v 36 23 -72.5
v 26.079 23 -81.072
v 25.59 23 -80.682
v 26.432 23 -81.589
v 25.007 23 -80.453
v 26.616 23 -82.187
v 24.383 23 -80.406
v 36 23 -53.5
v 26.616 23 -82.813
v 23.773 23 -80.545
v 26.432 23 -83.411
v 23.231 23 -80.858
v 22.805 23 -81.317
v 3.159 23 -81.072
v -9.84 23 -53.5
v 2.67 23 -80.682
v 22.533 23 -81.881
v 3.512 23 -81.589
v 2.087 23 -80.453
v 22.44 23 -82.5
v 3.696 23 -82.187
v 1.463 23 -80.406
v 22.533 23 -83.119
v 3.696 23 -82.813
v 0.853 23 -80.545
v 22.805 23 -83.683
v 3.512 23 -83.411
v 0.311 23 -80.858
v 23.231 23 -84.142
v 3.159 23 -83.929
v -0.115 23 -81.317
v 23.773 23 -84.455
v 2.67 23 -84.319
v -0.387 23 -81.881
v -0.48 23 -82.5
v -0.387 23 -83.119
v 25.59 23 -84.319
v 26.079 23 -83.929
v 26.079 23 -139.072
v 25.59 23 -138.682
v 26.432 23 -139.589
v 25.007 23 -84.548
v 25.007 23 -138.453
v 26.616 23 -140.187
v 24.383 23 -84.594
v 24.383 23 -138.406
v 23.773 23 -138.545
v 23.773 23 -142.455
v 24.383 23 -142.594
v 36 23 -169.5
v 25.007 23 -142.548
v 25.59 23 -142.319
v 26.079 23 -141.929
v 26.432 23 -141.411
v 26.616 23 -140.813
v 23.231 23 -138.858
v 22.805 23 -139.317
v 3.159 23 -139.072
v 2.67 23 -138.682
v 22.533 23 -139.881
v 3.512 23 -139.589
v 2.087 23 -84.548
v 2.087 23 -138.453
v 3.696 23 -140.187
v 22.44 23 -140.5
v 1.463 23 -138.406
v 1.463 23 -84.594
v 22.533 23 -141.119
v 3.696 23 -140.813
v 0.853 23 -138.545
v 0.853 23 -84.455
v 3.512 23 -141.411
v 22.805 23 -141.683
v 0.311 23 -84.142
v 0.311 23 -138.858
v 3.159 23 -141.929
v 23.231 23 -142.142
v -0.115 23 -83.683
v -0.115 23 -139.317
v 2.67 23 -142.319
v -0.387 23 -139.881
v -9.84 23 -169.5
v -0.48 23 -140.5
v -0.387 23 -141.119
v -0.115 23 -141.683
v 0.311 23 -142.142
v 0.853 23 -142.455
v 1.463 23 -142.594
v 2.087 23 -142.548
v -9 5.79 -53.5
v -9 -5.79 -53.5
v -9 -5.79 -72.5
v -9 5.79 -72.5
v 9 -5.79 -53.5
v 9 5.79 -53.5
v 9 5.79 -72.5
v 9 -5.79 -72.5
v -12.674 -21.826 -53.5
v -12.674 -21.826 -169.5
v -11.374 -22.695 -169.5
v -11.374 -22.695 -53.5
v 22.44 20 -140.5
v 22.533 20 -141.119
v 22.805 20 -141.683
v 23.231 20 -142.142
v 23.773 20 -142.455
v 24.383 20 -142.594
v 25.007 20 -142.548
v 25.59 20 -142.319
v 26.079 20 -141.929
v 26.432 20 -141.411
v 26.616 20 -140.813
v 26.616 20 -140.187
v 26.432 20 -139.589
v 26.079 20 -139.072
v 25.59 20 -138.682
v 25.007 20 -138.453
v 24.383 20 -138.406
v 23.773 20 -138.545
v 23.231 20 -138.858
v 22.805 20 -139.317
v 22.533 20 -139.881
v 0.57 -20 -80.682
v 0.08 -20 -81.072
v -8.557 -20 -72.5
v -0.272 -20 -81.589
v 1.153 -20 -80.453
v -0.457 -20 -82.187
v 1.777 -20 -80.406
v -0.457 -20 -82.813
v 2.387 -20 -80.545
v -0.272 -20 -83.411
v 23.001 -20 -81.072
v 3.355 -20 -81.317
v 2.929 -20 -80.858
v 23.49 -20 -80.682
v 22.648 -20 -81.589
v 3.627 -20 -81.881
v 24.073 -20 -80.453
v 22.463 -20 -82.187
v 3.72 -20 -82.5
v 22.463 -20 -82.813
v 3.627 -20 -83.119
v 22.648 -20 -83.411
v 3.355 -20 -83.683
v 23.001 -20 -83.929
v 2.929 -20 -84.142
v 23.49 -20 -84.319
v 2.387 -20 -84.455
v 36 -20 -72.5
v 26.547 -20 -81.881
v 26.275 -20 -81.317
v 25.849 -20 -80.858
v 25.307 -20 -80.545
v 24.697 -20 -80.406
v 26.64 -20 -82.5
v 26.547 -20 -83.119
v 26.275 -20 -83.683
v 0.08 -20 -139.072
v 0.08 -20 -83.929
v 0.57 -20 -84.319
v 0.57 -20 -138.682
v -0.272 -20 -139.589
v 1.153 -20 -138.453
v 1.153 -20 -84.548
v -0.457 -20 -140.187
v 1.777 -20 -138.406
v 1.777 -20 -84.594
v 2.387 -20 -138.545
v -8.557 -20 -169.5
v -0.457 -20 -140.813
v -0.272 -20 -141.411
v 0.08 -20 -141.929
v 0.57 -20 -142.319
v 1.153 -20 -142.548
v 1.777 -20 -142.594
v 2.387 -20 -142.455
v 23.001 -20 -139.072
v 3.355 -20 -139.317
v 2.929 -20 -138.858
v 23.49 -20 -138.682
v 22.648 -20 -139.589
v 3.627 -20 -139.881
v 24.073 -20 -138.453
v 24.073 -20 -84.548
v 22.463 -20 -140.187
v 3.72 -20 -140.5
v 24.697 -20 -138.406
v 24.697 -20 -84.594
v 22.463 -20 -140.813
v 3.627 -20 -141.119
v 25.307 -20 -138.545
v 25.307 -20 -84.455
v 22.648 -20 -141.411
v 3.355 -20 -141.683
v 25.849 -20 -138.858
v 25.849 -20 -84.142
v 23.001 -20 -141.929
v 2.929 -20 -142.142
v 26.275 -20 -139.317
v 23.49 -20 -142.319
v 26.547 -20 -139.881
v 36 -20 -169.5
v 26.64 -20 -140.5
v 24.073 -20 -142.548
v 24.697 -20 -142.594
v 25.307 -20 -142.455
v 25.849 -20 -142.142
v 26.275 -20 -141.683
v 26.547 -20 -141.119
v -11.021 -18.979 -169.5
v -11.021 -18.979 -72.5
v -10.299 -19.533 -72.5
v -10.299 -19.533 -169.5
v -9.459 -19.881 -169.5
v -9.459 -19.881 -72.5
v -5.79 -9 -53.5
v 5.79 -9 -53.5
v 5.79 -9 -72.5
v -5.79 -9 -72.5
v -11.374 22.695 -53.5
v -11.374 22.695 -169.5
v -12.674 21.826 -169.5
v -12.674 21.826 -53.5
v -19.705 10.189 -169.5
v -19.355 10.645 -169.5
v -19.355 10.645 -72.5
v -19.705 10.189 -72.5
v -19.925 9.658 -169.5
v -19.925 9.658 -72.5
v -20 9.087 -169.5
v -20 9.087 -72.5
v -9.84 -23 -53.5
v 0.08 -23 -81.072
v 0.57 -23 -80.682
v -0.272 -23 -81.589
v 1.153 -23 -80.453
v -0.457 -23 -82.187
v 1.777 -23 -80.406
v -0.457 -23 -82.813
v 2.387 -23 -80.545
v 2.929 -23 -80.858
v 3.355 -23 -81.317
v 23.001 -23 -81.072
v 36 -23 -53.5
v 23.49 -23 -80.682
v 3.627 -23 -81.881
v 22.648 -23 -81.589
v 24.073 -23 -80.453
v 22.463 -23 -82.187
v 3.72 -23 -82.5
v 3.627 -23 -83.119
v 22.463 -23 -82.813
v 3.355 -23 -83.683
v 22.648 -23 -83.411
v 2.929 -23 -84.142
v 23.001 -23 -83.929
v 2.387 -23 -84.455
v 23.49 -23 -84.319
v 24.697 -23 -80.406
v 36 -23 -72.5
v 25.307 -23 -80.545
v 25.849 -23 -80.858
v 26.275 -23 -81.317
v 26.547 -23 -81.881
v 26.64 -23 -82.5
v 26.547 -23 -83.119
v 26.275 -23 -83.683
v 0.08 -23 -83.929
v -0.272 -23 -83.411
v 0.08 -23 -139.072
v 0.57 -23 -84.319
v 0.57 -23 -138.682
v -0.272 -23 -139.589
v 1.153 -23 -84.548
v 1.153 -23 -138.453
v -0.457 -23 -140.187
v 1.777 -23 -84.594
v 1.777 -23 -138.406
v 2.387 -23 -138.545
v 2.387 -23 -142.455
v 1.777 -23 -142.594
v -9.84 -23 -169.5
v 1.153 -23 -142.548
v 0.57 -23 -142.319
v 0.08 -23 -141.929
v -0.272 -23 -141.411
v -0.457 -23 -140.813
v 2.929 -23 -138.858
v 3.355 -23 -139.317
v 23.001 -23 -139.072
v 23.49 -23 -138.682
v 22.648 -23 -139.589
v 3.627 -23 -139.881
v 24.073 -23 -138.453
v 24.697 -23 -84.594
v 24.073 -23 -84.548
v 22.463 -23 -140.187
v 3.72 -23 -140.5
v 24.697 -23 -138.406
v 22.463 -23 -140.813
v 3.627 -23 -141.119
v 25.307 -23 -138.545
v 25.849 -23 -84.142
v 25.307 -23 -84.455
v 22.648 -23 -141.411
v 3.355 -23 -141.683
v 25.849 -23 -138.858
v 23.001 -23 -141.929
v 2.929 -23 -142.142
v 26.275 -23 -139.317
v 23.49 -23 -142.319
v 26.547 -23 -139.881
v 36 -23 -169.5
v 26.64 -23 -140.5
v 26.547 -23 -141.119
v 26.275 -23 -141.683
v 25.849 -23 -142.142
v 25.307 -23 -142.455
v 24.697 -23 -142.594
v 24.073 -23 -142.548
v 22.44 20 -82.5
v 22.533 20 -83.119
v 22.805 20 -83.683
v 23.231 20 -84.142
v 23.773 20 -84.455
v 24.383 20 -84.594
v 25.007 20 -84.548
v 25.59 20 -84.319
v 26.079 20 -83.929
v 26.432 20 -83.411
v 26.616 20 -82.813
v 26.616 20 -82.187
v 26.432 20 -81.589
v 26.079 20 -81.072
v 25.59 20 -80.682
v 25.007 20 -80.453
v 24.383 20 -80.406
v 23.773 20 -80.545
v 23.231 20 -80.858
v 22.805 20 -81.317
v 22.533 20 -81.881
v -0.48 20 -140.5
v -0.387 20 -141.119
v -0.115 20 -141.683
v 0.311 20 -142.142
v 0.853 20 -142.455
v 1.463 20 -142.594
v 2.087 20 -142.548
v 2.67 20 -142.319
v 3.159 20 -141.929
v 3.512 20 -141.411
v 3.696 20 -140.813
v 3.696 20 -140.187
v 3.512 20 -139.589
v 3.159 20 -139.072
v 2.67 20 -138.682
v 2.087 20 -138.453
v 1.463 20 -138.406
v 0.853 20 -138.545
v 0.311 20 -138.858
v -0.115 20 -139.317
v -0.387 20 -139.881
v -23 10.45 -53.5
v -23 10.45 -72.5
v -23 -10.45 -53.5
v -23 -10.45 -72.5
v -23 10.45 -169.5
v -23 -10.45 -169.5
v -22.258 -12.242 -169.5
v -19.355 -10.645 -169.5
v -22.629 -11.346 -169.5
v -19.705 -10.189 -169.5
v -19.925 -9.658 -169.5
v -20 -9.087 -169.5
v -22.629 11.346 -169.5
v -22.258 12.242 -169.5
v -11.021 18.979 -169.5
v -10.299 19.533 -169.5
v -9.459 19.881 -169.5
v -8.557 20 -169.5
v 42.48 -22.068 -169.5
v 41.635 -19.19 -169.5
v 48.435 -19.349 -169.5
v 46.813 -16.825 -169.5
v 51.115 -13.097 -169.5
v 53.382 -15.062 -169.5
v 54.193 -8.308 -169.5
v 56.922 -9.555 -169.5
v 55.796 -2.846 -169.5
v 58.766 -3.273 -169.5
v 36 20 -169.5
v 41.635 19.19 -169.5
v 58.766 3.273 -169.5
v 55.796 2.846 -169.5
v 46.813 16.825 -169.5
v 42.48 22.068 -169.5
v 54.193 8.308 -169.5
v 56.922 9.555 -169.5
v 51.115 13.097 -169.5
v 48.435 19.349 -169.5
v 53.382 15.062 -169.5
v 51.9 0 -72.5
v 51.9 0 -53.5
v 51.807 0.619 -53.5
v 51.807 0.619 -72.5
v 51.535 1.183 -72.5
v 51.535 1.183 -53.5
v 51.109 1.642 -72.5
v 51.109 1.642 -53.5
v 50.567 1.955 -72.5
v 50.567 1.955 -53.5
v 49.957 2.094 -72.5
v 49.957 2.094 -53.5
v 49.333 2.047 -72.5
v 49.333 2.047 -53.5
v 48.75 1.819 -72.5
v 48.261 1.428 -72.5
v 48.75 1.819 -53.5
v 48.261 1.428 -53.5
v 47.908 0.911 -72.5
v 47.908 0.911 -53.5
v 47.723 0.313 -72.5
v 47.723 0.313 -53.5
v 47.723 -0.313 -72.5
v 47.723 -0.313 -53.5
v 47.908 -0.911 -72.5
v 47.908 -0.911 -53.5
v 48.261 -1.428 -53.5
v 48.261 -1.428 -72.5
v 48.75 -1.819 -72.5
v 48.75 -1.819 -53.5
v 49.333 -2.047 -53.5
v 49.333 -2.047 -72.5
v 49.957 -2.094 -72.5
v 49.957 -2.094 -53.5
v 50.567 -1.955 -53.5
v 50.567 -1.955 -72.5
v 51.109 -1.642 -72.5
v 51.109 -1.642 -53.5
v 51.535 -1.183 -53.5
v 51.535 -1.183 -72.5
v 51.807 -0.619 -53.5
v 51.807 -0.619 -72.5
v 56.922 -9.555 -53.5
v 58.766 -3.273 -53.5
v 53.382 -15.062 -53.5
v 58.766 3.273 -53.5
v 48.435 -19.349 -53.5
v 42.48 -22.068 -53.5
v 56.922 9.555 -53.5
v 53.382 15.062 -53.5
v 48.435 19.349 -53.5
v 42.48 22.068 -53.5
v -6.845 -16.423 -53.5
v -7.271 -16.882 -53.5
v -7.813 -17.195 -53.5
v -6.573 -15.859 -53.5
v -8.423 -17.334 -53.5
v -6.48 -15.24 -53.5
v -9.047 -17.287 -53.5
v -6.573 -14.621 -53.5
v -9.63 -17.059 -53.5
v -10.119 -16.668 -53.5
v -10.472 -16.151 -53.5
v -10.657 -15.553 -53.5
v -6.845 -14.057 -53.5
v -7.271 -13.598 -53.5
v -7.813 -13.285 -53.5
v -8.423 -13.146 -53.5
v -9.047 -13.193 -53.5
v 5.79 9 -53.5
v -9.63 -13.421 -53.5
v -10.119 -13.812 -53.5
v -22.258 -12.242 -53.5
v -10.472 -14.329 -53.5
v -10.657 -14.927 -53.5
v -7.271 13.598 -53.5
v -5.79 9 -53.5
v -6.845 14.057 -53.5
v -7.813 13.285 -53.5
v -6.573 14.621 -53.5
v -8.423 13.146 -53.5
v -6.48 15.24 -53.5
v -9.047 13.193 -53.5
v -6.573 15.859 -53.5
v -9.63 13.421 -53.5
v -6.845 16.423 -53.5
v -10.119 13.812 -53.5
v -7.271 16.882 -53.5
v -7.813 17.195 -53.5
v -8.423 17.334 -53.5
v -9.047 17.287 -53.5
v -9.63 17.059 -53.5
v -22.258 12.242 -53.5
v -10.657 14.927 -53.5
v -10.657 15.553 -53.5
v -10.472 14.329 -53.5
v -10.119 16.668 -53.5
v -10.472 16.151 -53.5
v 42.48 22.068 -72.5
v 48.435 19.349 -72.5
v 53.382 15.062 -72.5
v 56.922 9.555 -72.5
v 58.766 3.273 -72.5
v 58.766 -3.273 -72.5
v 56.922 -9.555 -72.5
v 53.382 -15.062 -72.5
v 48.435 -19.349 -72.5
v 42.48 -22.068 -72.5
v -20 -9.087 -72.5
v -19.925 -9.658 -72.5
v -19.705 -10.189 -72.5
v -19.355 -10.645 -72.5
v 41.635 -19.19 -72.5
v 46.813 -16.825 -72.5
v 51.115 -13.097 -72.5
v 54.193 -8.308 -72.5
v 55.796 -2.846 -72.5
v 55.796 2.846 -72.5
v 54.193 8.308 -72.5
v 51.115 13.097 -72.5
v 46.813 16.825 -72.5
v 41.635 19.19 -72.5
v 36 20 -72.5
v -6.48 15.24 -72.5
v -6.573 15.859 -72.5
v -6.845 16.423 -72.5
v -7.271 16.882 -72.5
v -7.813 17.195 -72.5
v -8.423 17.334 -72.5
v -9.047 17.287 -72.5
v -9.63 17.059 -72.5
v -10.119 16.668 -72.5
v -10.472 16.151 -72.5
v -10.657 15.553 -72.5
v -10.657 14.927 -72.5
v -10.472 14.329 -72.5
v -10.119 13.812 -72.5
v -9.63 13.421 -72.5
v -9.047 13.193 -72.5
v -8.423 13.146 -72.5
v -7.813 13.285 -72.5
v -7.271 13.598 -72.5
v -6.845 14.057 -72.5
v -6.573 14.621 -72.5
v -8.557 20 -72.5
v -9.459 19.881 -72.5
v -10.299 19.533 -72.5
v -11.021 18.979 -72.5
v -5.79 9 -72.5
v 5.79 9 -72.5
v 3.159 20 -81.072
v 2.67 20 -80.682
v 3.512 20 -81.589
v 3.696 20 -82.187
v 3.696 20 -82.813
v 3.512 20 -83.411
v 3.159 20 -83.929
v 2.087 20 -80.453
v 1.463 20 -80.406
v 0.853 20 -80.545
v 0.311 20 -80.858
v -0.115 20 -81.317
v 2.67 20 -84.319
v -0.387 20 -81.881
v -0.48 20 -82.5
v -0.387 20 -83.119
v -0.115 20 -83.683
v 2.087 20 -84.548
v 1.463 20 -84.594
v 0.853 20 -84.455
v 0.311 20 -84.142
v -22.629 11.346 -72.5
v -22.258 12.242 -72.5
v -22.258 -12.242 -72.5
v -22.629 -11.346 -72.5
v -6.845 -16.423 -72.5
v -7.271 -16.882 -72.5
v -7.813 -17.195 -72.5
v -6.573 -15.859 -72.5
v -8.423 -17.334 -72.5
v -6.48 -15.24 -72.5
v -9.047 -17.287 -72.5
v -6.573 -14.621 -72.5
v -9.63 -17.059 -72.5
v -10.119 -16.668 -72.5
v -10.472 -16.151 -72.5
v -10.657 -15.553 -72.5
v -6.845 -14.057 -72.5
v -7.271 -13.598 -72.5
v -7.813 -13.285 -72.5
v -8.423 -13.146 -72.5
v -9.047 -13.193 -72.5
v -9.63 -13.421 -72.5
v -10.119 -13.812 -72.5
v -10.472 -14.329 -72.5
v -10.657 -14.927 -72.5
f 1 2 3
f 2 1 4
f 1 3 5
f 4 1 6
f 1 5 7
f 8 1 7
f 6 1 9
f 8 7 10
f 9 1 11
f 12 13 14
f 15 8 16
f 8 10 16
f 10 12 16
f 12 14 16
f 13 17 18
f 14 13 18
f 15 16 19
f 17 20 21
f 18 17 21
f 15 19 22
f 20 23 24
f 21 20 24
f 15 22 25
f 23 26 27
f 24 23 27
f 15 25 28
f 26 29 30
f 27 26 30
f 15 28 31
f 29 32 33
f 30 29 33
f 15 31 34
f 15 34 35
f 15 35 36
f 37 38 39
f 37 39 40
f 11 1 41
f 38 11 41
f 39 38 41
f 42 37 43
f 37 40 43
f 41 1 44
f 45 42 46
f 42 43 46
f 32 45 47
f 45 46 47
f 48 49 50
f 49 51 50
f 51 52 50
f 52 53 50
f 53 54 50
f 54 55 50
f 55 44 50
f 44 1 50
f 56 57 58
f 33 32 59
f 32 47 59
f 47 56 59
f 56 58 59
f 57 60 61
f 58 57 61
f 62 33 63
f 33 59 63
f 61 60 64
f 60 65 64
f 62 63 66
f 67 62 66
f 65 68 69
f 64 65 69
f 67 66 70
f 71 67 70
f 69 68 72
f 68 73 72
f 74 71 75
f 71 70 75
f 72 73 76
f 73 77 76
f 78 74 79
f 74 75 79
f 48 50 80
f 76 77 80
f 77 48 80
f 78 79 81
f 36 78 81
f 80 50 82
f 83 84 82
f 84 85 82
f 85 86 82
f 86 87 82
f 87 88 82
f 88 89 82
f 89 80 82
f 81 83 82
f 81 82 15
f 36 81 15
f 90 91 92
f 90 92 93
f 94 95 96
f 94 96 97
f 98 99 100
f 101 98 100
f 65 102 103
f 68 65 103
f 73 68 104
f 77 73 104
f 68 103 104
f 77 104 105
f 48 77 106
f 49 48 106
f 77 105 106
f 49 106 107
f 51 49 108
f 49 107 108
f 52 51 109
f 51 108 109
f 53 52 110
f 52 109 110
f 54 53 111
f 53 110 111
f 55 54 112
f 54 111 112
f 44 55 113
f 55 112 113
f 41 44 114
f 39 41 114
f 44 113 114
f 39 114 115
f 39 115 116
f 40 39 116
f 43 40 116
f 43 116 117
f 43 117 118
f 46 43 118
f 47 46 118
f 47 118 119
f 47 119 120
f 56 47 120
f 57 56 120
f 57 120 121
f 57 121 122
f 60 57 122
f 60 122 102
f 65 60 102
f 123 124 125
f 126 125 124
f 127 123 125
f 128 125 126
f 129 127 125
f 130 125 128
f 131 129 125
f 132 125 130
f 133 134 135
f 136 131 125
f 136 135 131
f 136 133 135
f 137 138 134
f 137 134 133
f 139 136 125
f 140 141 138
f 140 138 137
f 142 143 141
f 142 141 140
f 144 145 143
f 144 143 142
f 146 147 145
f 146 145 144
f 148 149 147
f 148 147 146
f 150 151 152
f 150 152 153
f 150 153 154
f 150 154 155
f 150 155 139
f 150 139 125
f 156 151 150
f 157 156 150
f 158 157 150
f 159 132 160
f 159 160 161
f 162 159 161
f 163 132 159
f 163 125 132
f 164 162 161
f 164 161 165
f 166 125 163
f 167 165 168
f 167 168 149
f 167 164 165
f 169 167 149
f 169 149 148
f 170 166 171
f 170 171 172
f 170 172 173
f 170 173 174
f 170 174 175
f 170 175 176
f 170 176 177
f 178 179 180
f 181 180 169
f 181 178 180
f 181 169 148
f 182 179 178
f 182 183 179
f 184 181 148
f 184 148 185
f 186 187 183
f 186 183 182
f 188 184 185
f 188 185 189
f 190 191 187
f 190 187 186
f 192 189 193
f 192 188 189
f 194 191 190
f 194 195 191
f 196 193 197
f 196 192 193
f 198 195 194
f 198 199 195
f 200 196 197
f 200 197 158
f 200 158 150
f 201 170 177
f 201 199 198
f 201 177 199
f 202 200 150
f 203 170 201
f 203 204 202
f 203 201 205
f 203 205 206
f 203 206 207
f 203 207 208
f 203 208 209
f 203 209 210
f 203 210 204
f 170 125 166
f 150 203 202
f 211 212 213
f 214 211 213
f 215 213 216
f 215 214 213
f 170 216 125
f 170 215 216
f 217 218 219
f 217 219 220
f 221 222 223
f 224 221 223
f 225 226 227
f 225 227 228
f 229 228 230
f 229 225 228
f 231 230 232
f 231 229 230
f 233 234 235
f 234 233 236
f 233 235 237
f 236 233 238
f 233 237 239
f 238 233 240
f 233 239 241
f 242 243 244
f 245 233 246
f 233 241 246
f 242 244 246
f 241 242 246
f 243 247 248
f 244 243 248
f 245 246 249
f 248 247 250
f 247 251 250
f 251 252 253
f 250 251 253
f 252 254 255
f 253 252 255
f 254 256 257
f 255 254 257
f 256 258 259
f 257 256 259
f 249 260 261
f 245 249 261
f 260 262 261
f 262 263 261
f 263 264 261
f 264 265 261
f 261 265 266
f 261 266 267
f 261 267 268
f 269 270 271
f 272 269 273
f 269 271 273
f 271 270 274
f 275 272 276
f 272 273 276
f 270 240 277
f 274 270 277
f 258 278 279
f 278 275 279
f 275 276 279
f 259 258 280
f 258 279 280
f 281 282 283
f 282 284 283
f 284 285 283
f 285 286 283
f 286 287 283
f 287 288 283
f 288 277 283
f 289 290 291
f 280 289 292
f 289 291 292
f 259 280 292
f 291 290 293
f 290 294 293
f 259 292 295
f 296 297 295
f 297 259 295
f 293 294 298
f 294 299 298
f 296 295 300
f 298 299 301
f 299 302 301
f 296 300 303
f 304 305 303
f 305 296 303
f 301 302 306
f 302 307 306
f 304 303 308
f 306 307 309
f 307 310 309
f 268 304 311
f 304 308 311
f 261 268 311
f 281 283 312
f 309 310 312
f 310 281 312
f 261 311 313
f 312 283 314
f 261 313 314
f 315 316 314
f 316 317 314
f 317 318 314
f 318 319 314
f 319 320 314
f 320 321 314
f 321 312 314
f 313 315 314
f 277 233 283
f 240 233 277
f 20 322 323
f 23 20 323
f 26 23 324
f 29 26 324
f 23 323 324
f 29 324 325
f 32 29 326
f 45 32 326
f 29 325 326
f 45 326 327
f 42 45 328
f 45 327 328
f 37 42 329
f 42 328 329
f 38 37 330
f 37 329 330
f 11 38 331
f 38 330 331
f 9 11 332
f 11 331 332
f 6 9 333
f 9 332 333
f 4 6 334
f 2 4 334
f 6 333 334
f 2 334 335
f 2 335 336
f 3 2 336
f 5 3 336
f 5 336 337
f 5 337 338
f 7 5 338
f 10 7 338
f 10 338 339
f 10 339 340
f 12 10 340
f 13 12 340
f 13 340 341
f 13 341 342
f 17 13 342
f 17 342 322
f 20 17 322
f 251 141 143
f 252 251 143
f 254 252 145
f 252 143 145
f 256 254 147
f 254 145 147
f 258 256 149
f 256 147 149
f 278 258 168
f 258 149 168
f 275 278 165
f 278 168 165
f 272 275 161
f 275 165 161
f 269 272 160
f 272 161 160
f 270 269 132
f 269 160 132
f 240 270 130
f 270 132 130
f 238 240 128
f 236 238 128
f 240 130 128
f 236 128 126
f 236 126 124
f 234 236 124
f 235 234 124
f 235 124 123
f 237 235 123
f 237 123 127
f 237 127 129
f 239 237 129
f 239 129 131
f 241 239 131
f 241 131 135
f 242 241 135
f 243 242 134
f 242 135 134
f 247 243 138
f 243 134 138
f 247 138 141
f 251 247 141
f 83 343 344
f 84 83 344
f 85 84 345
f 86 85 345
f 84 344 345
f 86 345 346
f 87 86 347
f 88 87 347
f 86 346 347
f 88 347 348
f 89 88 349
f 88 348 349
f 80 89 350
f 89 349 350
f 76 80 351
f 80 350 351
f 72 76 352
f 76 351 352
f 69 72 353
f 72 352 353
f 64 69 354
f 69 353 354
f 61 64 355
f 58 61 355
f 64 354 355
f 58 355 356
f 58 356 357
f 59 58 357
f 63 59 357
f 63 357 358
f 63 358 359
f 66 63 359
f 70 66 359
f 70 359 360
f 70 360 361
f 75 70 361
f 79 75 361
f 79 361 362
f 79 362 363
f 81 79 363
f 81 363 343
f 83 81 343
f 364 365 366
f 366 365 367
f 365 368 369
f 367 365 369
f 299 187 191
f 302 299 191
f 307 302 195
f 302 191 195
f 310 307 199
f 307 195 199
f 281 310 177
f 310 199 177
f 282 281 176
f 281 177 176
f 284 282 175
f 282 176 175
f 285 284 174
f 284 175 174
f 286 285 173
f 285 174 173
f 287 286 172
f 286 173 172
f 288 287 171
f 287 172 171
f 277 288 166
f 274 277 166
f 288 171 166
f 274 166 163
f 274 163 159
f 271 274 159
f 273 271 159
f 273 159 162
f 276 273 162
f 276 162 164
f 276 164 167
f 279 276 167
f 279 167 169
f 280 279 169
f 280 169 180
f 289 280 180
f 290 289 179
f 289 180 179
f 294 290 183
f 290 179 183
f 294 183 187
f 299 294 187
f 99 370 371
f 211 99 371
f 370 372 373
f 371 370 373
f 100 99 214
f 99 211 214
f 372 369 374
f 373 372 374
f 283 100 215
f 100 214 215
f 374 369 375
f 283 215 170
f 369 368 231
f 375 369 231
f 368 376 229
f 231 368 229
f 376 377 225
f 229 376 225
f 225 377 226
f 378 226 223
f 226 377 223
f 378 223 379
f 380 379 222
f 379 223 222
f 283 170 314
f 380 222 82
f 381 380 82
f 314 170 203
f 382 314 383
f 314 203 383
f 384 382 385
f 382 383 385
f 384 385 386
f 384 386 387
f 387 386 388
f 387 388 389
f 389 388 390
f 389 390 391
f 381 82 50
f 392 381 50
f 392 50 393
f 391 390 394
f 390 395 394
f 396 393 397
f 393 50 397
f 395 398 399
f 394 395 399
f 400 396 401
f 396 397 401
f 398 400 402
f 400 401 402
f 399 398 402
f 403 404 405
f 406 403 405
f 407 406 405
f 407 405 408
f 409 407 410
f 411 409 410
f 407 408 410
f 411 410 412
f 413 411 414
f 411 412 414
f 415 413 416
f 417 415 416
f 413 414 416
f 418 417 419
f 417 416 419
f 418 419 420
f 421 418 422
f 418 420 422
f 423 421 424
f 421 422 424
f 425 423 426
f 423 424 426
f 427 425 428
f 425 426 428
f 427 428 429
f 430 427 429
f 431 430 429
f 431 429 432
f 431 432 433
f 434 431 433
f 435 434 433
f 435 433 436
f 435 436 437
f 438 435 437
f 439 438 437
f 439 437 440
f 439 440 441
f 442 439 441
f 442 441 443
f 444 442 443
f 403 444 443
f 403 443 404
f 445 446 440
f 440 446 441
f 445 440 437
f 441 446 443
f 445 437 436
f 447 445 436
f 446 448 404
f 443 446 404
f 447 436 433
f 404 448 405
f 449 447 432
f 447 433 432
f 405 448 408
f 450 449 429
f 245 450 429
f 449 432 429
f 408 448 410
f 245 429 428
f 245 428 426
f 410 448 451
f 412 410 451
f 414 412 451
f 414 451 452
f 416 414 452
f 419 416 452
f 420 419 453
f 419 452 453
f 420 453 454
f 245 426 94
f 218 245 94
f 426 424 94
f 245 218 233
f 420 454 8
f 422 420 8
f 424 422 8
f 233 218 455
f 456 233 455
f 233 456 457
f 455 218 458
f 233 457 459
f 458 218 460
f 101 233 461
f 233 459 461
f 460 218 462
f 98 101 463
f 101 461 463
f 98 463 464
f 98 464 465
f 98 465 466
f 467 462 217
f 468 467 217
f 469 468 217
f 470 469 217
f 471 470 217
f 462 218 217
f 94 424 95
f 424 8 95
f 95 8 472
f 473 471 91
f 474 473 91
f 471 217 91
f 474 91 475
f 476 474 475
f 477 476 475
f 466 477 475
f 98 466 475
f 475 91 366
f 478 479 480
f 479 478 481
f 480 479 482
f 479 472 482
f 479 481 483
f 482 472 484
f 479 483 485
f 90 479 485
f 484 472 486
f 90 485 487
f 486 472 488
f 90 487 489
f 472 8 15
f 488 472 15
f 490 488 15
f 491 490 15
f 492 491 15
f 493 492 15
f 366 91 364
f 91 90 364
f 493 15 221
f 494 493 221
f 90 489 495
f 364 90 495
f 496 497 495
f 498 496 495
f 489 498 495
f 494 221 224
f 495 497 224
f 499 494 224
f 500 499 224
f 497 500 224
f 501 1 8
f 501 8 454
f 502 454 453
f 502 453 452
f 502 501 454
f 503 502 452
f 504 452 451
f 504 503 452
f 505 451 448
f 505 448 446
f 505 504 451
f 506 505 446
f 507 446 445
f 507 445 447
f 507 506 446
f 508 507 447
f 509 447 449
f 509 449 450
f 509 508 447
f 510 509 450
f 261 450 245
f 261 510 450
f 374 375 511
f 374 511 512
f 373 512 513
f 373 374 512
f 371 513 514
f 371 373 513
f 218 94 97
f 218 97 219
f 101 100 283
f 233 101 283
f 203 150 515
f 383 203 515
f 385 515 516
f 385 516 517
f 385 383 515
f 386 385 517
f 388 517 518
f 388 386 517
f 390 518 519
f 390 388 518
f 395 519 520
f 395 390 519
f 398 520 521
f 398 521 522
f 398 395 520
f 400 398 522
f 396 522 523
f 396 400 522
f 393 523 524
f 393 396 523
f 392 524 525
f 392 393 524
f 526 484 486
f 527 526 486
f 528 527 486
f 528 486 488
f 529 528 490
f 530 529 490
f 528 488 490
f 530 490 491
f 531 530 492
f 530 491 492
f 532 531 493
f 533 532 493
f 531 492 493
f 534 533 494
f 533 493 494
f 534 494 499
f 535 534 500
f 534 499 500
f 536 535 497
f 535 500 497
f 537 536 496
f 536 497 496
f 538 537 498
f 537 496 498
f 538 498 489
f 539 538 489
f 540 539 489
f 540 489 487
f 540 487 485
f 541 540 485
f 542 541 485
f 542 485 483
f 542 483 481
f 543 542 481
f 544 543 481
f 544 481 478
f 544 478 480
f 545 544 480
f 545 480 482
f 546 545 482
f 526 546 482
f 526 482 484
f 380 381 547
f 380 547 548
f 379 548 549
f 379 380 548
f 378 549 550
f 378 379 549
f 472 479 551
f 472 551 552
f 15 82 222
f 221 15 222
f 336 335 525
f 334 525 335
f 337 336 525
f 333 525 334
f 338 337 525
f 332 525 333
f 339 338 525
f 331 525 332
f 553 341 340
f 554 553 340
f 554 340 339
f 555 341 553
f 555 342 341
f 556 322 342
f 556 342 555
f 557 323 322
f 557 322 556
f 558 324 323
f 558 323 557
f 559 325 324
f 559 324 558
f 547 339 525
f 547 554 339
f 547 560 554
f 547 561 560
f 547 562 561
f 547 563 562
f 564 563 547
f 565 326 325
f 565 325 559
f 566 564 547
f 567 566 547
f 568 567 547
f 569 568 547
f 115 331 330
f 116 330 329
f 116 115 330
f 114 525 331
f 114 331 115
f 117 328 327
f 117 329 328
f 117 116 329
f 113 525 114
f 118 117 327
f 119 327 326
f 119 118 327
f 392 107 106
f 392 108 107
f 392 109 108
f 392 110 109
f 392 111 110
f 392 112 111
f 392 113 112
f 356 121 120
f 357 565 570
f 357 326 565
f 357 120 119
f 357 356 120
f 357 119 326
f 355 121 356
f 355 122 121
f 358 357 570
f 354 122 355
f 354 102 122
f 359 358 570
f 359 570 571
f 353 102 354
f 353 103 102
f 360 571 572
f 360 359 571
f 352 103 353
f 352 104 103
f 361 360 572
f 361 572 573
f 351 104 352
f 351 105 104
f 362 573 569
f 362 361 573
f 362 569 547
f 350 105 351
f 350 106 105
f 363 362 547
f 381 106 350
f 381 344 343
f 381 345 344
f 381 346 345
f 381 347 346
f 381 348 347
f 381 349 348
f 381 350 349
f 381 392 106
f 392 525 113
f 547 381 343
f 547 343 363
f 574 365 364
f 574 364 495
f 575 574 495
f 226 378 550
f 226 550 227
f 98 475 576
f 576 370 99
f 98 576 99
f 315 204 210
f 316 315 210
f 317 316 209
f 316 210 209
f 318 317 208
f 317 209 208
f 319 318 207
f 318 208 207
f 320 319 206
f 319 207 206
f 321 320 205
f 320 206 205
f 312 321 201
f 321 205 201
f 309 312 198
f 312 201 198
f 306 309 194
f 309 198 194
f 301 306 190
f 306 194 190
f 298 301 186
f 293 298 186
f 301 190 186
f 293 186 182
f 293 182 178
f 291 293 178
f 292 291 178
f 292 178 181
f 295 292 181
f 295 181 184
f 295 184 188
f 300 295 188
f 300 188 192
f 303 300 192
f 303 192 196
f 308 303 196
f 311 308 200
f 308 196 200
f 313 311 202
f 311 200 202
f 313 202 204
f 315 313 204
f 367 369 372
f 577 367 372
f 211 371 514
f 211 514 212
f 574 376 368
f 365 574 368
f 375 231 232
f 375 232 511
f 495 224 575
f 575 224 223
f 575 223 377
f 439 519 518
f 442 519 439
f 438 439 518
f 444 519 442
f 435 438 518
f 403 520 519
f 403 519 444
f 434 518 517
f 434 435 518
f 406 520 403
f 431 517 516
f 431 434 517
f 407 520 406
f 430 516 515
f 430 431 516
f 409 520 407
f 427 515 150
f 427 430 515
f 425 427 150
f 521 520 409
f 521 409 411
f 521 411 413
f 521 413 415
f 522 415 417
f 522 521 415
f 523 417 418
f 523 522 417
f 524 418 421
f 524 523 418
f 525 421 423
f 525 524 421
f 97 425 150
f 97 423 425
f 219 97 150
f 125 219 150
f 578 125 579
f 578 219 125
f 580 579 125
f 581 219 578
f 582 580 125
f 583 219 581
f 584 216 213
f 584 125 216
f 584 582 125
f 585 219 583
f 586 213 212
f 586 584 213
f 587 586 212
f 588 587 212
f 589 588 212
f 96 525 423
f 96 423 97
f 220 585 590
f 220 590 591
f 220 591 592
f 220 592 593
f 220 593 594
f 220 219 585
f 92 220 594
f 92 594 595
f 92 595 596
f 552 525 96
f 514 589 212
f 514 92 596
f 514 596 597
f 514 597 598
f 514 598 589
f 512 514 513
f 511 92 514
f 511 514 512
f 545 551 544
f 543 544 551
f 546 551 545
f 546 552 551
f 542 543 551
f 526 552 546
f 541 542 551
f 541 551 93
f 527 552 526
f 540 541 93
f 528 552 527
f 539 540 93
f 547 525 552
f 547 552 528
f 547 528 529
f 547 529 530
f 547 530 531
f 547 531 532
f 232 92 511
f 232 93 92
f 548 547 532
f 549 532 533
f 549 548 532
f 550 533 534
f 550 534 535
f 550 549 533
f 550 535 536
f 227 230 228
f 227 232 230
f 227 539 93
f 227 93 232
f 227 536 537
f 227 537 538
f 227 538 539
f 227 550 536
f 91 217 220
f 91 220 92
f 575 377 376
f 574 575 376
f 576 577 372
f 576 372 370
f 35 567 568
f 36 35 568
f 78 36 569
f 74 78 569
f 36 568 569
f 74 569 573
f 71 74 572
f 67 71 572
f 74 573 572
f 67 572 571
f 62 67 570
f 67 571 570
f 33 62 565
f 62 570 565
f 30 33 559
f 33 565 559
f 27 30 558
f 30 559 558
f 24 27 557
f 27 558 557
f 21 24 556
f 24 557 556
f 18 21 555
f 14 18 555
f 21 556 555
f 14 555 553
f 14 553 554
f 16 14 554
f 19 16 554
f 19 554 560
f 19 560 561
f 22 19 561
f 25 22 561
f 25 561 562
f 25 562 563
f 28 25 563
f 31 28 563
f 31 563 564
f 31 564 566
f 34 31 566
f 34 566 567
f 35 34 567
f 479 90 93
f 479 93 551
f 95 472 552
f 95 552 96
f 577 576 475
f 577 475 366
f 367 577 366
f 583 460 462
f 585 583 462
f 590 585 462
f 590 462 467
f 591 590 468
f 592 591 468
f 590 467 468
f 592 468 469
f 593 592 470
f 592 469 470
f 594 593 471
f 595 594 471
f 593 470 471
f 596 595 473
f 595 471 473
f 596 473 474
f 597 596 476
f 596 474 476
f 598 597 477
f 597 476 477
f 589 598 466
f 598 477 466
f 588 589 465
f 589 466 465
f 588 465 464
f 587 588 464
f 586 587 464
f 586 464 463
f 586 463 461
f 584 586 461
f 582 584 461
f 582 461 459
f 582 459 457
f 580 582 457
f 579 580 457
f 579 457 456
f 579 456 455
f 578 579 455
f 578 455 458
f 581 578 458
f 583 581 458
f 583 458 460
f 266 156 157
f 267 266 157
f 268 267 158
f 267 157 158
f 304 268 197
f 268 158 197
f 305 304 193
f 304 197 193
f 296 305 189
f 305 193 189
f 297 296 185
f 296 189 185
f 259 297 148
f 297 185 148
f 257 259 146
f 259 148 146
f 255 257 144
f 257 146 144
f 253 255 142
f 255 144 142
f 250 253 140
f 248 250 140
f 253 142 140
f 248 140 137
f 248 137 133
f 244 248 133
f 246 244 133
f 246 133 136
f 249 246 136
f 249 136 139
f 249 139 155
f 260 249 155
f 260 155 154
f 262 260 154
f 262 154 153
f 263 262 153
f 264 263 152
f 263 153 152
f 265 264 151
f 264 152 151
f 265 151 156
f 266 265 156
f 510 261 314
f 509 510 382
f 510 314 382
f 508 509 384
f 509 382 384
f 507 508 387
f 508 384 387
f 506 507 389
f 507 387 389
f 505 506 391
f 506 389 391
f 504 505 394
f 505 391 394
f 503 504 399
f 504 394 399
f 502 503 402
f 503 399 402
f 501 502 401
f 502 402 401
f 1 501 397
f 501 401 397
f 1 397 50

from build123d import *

# Parameters (mm, degrees)
EXTRUDE_1_DEPTH        = 19
CUT_EXTRUDE_1_REACH    = 68.114
EXTRUDE_START          = 97
EXTRUDE_2_DEPTH        = 97
CUT_EXTRUDE_2_REACH    = 134.159
SKETCH_8_R             = 2.1
HOLE_WIZARD_M5_1_D     = 4.2
HOLE_WIZARD_M5_1_DEPTH = 3
HOLE_WIZARD_M5_2_D     = 4.2


with BuildPart() as part:
    # 草图2 → 凸台-拉伸1 (new body)
    with BuildSketch(Plane.XY.offset(-72.500175037)):
        with BuildLine():
            Line((-9.84018, -23), (-11.373653726, -22.694973111))
            Line((-11.373653726, -22.694973111), (-12.673669978, -21.826330022))
            Line((-12.673669978, -21.826330022), (-22.257871236, -12.242128764))
            Line((-22.257871236, -12.242128764), (-23, -10.450471437))
            Line((-23, -10.450471437), (-23, 10.450471437))
            Line((-23, 10.450471437), (-22.257871236, 12.242128764))
            Line((-22.257871236, 12.242128764), (-12.673669978, 21.826330022))
            Line((-12.673669978, 21.826330022), (-11.373653726, 22.694973111))
            Line((-11.373653726, 22.694973111), (-9.84018, 23))
            Line((-9.84018, 23), (36.000000003, 23))
            ThreePointArc((36.000000003, 23), (59.000000003, 0), (36.000000003, -23))
            Line((36.000000003, -23), (-9.84018, -23))
        make_face()
    extrude(amount=EXTRUDE_1_DEPTH)

    # 草图4 → 切除-拉伸1 (cut, up to next)
    with BuildSketch(Plane.XY.offset(-53.500175037), mode=Mode.PRIVATE) as cut_extrude_1_sk1:
        Polygon((5.790000003, -9), (-5.789999997, -9), (-8.999999997, -5.79), (-8.999999997, 5.79), (-5.789999997, 9), (5.790000003, 9), (9.000000003, 5.79), (9.000000003, -5.79), align=None)
    cut_extrude_1_tool1 = extrude(cut_extrude_1_sk1.sketch, amount=-CUT_EXTRUDE_1_REACH, mode=Mode.PRIVATE) & part.part
    add(cut_extrude_1_tool1.solids().sort_by_distance((0, 0, -53.500175))[0], mode=Mode.SUBTRACT)

    # 草图7 → 凸台-拉伸2 (add)
    with BuildSketch(Plane(origin=(0, 0, -72.500175037), x_dir=(-1, 0, 0), z_dir=(0, 0, -1)).offset(EXTRUDE_START)):
        with BuildLine():
            Line((-36.000000003, 23), (9.84018, 23))
            Line((9.84018, 23), (11.373653726, 22.694973111))
            Line((11.373653726, 22.694973111), (12.673669978, 21.826330022))
            Line((12.673669978, 21.826330022), (22.257871236, 12.242128764))
            Line((22.257871236, 12.242128764), (22.628935618, 11.3463001))
            Line((22.628935618, 11.3463001), (23, 10.450471437))
            Line((23, 10.450471437), (23, -10.450471437))
            Line((23, -10.450471437), (22.628935618, -11.3463001))
            Line((22.628935618, -11.3463001), (22.257871236, -12.242128764))
            Line((22.257871236, -12.242128764), (12.673669978, -21.826330022))
            Line((12.673669978, -21.826330022), (11.373653726, -22.694973111))
            Line((11.373653726, -22.694973111), (9.84018, -23))
            Line((9.84018, -23), (-36.000000003, -23))
            ThreePointArc((-36.000000003, -23), (-59, 0), (-36.000000003, 23))
        make_face()
        with BuildLine():
            Line((3.252486509, 20), (8.556678261, 20))
            ThreePointArc((8.556678261, 20), (9.890133674, 19.734759227), (11.020582589, 18.979417411))
            Line((11.020582589, 18.979417411), (19.35467064, 10.64532936))
            ThreePointArc((19.35467064, 10.64532936), (19.832284364, 9.930529909), (20, 9.087366467))
            Line((20, 9.087366467), (20, -9.087366467))
            ThreePointArc((20, -9.087366467), (19.832284364, -9.930529909), (19.35467064, -10.64532936))
            Line((19.35467064, -10.64532936), (11.020582589, -18.979417411))
            ThreePointArc((11.020582589, -18.979417411), (9.890133674, -19.734759227), (8.556678261, -20))
            Line((8.556678261, -20), (-36, -20))
            ThreePointArc((-36, -20), (-56, 0), (-36, 20))
            Line((-36, 20), (3.252486509, 20))
        make_face(mode=Mode.SUBTRACT)
    extrude(amount=-EXTRUDE_2_DEPTH)

    # 草图8 → 切除-拉伸2 (cut, up to next)
    with BuildSketch(Plane.XY.offset(-53.500175037), mode=Mode.PRIVATE) as cut_extrude_2_sk1:
        with Locations((49.800000003, 0)):
            Circle(SKETCH_8_R)
    cut_extrude_2_tool1 = extrude(cut_extrude_2_sk1.sketch, amount=-CUT_EXTRUDE_2_REACH, mode=Mode.PRIVATE) & part.part
    # 草图8 → 切除-拉伸2 (cut, up to next)
    with BuildSketch(Plane.XY.offset(-53.500175037), mode=Mode.PRIVATE) as cut_extrude_2_sk2:
        with Locations((-8.579999997, -15.24)):
            Circle(SKETCH_8_R)
    cut_extrude_2_tool2 = extrude(cut_extrude_2_sk2.sketch, amount=-CUT_EXTRUDE_2_REACH, mode=Mode.PRIVATE) & part.part
    # 草图8 → 切除-拉伸2 (cut, up to next)
    with BuildSketch(Plane.XY.offset(-53.500175037), mode=Mode.PRIVATE) as cut_extrude_2_sk3:
        with Locations((-8.579999997, 15.24)):
            Circle(SKETCH_8_R)
    cut_extrude_2_tool3 = extrude(cut_extrude_2_sk3.sketch, amount=-CUT_EXTRUDE_2_REACH, mode=Mode.PRIVATE) & part.part
    add(cut_extrude_2_tool1.solids().sort_by_distance((49.8, 0, -53.500175))[0], mode=Mode.SUBTRACT)
    add(cut_extrude_2_tool2.solids().sort_by_distance((-8.58, -15.24, -53.500175))[0], mode=Mode.SUBTRACT)
    add(cut_extrude_2_tool3.solids().sort_by_distance((-8.58, 15.24, -53.500175))[0], mode=Mode.SUBTRACT)

    # M5 螺纹孔1
    with Locations(Plane(origin=(0, -23, 0), x_dir=(-1, 0, 0), z_dir=(0, -1, 0))):
        with Locations((-1.619865001, 82.500175037), (-24.539955002, 82.500175037), (-24.539955002, 140.500175037), (-1.619865001, 140.500175037)):
            Hole(HOLE_WIZARD_M5_1_D / 2, depth=HOLE_WIZARD_M5_1_DEPTH)

    # M5 螺纹孔2 (through all)
    with Locations(Plane(origin=(0, 23, 0), x_dir=(1, 0, 0), z_dir=(0, 1, 0))):
        with Locations((24.539955002, 140.500175037), (1.619865001, 140.500175037), (24.539955002, 82.500175037), (1.619865001, 82.500175037)):
            Hole(HOLE_WIZARD_M5_2_D / 2)


solid = part.part
